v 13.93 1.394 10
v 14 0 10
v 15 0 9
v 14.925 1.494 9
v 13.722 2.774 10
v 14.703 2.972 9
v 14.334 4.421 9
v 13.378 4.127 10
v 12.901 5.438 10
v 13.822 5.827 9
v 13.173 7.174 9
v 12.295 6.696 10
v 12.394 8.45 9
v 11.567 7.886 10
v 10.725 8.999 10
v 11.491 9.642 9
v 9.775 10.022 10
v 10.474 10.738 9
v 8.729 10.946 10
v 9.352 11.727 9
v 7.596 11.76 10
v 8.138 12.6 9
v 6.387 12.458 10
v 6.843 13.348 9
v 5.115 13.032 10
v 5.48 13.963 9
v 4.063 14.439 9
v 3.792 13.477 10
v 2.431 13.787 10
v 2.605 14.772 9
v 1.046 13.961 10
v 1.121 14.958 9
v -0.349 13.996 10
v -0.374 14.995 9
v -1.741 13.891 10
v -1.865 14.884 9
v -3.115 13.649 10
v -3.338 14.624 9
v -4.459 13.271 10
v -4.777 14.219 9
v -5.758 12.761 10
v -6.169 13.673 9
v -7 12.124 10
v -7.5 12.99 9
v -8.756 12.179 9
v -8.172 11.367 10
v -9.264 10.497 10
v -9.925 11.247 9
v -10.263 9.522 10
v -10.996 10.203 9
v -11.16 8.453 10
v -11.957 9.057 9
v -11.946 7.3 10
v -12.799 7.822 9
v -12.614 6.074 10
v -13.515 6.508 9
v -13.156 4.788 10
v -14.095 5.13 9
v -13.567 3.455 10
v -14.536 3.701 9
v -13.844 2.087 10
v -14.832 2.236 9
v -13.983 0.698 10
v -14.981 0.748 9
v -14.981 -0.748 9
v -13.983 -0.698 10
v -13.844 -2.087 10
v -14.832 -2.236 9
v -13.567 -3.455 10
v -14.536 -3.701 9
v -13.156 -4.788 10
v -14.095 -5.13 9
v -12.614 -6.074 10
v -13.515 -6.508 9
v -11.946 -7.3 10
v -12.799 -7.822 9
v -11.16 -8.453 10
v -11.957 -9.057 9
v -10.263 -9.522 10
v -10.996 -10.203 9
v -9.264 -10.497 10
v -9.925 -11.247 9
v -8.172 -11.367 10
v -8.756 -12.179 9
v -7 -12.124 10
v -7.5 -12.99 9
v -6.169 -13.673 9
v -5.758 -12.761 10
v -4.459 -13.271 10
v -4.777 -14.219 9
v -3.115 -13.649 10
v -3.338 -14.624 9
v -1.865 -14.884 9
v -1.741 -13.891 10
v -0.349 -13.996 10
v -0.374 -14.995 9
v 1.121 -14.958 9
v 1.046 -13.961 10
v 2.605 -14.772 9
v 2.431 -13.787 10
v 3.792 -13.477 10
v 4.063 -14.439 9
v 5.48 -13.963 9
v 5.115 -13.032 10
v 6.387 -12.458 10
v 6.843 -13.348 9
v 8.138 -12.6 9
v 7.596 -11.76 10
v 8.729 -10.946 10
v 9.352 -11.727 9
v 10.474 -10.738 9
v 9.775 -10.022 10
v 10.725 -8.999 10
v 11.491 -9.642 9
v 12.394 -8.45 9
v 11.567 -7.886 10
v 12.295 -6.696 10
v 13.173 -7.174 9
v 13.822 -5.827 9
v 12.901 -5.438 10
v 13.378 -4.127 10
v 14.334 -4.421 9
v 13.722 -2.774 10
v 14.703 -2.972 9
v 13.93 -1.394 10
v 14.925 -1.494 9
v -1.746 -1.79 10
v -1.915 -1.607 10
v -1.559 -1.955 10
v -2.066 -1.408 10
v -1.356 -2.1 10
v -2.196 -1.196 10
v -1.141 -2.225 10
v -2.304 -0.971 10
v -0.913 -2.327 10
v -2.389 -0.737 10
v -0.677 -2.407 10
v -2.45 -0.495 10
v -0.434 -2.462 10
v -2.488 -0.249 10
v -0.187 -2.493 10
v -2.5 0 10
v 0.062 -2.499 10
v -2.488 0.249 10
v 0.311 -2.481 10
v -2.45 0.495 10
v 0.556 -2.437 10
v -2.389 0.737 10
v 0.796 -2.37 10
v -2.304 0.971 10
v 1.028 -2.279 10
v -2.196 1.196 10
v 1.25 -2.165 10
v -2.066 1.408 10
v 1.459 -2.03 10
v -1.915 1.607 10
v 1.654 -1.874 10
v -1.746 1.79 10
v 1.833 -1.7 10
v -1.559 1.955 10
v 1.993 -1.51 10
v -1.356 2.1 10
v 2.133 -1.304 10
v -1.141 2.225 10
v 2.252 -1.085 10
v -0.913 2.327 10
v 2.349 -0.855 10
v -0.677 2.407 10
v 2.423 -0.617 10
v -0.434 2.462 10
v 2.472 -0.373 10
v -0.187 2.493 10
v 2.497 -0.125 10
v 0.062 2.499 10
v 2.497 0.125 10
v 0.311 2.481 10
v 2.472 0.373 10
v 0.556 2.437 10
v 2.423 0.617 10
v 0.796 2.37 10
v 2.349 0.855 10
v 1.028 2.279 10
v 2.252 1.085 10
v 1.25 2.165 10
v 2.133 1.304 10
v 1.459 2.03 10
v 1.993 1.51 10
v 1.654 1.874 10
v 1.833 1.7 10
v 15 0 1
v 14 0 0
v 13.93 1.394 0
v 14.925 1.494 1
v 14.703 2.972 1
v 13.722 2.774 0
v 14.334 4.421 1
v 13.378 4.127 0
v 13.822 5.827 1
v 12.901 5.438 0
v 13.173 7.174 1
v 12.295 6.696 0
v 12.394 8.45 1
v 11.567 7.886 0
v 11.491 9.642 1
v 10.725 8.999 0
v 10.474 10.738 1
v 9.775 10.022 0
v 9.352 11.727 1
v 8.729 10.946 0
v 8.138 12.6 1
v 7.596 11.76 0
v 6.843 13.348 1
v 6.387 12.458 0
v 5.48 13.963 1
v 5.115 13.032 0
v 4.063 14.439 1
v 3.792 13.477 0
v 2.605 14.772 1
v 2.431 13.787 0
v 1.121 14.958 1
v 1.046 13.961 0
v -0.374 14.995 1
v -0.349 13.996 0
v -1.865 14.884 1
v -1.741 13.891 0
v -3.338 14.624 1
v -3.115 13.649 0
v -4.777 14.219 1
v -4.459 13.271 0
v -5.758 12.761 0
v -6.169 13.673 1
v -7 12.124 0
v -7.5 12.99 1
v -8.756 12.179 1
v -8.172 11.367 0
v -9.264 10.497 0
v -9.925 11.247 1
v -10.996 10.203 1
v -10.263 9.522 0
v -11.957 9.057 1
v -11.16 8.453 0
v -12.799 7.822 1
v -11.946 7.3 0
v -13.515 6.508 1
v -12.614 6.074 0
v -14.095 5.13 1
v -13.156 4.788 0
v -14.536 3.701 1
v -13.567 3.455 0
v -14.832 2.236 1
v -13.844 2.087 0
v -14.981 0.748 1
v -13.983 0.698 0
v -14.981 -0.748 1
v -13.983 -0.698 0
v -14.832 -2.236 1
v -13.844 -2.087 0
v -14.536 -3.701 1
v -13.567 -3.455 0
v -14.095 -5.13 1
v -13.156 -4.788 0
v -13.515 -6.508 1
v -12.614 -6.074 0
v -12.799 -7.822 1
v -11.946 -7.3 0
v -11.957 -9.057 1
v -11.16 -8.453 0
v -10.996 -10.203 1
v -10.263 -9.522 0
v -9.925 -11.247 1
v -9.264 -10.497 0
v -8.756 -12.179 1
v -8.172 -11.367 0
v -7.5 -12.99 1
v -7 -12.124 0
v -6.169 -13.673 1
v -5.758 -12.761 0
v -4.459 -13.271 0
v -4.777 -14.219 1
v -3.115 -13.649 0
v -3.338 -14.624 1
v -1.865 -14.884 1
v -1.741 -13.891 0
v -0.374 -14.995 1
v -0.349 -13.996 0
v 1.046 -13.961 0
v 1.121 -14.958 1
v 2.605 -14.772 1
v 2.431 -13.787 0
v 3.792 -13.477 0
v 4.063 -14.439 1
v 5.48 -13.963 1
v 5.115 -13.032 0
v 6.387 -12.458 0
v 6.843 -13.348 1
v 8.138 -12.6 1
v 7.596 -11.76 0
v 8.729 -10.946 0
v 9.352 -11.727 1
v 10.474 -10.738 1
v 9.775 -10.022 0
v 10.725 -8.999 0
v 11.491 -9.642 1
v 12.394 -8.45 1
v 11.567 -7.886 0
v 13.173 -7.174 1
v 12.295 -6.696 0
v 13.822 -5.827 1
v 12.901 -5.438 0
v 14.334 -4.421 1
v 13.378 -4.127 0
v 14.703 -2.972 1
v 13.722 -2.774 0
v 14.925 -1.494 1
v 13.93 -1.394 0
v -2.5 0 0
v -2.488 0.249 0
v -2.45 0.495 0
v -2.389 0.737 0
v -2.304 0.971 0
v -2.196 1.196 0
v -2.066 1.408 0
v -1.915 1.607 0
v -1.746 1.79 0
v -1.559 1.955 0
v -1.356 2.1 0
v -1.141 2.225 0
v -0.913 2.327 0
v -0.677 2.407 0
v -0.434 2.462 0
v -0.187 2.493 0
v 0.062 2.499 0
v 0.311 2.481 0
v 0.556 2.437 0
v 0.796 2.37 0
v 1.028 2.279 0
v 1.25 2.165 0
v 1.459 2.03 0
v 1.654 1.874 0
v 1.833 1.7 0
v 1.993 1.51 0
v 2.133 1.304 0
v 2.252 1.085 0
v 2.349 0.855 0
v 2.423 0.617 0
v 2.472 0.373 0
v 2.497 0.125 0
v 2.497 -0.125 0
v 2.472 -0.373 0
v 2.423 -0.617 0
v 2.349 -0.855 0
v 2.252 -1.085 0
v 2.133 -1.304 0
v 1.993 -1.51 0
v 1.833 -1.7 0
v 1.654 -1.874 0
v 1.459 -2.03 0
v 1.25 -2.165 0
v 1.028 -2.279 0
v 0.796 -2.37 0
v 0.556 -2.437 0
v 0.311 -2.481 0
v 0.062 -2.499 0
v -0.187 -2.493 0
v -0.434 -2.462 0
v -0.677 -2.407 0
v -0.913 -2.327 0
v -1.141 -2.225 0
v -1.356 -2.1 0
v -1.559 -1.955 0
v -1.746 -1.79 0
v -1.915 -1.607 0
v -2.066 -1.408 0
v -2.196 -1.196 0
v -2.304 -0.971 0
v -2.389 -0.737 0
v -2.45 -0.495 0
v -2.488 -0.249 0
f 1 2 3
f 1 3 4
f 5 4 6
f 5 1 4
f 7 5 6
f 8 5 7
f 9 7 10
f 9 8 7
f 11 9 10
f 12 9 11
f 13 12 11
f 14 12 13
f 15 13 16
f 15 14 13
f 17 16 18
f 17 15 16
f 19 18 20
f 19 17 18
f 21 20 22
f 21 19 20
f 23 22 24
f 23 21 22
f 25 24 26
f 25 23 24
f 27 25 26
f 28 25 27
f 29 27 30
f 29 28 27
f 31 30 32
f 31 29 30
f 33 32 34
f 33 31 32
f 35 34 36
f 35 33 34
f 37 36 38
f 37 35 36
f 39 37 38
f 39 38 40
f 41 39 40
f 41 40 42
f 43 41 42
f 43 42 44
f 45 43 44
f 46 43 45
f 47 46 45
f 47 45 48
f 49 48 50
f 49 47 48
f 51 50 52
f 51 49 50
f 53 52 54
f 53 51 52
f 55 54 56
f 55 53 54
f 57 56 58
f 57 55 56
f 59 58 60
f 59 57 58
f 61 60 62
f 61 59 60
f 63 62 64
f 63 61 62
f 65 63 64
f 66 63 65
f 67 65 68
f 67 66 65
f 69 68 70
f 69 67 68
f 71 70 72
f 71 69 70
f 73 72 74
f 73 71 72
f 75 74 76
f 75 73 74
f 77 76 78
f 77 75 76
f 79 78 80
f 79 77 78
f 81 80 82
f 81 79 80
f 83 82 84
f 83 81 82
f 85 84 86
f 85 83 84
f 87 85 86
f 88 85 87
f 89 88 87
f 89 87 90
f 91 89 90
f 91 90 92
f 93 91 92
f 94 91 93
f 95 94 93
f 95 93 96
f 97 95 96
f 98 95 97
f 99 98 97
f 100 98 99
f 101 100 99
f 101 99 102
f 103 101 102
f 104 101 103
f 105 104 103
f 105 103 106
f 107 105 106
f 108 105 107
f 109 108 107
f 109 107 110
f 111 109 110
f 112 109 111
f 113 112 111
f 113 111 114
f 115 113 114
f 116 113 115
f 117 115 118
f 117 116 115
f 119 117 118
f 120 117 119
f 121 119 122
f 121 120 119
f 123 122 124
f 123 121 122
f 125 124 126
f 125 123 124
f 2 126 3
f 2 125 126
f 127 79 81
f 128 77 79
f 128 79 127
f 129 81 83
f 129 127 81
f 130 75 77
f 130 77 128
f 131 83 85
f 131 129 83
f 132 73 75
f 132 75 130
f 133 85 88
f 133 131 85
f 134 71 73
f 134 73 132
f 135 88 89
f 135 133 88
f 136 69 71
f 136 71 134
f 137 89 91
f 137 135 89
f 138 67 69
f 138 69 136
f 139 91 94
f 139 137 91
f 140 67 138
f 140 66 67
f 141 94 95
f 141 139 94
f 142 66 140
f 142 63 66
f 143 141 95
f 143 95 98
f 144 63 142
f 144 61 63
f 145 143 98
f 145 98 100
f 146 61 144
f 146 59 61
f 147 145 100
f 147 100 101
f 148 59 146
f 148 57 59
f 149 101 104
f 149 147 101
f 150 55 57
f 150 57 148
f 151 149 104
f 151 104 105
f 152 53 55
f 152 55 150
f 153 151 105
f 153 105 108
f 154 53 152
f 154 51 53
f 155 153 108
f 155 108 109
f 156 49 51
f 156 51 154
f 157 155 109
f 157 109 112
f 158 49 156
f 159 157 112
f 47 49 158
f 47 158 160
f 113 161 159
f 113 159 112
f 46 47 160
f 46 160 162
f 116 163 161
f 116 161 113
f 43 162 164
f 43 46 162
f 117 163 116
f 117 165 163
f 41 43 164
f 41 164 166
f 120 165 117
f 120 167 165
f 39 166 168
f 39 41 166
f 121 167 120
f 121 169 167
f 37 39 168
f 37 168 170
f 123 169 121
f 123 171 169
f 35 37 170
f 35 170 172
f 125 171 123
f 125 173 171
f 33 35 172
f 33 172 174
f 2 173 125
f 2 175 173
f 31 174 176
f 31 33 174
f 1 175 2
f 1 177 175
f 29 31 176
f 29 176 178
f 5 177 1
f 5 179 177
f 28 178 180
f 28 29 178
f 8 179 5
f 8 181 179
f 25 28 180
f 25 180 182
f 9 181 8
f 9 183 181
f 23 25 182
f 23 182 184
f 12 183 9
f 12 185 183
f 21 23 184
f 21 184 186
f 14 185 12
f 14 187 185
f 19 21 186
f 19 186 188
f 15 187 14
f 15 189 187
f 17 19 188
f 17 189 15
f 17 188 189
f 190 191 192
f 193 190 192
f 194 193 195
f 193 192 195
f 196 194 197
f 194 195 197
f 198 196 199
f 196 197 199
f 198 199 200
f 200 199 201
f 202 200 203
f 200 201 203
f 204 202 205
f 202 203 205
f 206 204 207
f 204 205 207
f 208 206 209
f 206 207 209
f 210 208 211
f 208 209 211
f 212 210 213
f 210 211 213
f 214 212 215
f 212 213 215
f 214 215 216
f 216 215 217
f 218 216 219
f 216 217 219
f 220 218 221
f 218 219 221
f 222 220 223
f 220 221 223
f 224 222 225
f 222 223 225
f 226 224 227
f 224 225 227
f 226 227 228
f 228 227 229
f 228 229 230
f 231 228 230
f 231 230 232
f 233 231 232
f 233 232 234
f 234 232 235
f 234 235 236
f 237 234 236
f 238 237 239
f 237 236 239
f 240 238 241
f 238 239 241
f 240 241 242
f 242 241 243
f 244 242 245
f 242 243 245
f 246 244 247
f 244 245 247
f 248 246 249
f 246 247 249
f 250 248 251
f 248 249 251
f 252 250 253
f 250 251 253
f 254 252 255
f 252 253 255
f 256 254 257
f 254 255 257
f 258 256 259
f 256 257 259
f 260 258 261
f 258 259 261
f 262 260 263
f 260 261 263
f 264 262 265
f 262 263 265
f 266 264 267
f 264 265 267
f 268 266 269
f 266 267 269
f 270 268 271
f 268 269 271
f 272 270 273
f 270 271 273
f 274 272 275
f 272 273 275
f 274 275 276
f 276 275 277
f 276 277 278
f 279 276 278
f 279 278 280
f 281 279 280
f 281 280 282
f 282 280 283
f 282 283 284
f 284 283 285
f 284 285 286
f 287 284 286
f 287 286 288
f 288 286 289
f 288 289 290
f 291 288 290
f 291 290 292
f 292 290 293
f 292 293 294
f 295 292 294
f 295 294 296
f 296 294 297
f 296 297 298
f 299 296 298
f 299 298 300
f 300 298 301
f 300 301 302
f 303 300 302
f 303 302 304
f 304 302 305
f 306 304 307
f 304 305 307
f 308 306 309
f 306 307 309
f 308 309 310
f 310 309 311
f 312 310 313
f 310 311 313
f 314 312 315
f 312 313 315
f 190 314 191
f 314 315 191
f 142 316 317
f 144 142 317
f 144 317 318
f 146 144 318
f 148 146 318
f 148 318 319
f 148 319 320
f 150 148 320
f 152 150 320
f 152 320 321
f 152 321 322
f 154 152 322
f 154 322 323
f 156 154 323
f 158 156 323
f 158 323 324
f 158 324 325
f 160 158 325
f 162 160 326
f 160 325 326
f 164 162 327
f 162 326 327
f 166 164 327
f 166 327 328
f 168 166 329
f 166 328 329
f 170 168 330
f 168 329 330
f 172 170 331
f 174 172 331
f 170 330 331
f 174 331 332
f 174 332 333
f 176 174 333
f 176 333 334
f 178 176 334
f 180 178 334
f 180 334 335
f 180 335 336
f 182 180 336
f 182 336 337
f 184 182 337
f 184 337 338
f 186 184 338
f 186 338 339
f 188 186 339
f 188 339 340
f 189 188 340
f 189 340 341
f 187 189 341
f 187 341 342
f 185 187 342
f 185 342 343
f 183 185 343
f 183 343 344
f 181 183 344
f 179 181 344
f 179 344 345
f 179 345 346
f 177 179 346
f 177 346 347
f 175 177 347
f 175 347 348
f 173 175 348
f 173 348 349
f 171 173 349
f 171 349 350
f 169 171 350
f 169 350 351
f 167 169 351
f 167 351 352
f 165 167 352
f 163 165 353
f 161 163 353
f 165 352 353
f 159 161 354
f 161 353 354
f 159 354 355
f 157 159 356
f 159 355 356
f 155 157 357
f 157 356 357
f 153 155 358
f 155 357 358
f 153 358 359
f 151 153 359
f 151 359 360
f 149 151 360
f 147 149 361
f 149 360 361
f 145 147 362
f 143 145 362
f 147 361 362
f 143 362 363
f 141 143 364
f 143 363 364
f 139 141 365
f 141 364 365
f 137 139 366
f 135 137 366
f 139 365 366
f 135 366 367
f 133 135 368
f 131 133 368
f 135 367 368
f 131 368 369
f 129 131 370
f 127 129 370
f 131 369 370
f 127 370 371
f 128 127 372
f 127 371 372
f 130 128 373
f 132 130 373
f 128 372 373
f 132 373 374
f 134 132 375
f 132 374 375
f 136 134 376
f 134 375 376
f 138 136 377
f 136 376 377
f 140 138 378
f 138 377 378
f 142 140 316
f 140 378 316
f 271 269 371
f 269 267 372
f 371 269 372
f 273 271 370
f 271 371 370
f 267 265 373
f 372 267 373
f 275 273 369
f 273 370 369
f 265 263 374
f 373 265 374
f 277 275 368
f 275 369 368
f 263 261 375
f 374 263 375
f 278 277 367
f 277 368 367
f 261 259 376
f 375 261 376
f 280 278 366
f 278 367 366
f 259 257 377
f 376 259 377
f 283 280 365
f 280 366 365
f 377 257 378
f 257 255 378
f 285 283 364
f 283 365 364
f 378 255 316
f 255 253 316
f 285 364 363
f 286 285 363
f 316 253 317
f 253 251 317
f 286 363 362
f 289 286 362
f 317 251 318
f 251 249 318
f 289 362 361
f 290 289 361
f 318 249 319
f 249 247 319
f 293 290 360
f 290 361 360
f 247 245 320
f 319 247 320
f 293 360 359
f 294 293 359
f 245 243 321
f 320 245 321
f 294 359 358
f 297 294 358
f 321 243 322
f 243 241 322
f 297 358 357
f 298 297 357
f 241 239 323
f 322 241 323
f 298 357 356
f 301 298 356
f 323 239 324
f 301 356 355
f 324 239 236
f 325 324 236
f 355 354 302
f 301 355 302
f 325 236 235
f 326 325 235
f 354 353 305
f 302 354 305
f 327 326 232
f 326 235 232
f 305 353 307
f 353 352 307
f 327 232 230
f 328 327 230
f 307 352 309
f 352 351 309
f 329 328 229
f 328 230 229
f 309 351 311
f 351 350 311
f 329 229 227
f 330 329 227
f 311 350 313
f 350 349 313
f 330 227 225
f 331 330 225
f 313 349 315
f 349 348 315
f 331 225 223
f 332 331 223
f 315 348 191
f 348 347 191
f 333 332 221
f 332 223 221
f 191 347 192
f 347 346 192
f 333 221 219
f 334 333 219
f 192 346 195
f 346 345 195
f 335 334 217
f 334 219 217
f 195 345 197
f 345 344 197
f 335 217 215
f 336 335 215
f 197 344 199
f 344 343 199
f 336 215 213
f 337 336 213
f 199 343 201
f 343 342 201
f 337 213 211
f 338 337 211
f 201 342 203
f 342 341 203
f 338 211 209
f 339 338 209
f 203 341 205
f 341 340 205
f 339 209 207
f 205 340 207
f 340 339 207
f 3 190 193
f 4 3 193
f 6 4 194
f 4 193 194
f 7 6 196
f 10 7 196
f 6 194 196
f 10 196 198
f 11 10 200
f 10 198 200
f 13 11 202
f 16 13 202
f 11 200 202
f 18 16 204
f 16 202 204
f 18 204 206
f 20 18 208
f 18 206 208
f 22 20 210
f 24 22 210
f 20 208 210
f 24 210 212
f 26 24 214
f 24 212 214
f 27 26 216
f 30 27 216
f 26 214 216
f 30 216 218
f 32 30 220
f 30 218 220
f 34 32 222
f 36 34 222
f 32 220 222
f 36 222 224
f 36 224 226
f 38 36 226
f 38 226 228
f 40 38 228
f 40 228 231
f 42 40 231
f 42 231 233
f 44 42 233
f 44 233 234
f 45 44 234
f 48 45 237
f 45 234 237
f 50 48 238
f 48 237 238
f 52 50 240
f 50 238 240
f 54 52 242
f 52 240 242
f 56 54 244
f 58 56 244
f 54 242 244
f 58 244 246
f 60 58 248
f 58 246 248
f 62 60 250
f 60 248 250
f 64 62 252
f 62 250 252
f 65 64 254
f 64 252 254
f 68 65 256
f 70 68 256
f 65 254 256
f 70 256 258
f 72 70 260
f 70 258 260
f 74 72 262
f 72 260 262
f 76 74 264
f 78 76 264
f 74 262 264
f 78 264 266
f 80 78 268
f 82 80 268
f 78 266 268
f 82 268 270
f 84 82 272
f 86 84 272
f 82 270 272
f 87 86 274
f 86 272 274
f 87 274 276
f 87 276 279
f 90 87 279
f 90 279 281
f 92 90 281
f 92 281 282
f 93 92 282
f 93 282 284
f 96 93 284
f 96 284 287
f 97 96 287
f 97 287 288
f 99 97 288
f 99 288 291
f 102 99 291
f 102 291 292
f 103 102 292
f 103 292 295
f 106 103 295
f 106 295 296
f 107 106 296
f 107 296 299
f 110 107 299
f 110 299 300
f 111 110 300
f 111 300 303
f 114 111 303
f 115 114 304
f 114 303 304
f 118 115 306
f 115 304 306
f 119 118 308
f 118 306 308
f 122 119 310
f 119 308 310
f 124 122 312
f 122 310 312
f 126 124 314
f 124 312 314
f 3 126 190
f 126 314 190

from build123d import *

# Parameters (mm, degrees)
F0_R     = 15
F1_DEPTH = 10
F2_SIZE  = 1
F4_D     = 5


with BuildPart() as f1:
    # F0 (on Top) → F1 (new body)
    with BuildSketch(Plane.XY):
        Circle(F0_R)
    extrude(amount=F1_DEPTH)

    # F2
    f2_edges = [f1.edges().sort_by_distance(p)[0] for p in [
        (-15, 0, 10),
        (-15, 0, 0),
    ]]
    chamfer(f2_edges, length=F2_SIZE)

    # F4 (through all)
    with Locations(Plane.XY.offset(10)):
        with Locations((0, 0)):
            Hole(F4_D / 2)


solid = f1.part
